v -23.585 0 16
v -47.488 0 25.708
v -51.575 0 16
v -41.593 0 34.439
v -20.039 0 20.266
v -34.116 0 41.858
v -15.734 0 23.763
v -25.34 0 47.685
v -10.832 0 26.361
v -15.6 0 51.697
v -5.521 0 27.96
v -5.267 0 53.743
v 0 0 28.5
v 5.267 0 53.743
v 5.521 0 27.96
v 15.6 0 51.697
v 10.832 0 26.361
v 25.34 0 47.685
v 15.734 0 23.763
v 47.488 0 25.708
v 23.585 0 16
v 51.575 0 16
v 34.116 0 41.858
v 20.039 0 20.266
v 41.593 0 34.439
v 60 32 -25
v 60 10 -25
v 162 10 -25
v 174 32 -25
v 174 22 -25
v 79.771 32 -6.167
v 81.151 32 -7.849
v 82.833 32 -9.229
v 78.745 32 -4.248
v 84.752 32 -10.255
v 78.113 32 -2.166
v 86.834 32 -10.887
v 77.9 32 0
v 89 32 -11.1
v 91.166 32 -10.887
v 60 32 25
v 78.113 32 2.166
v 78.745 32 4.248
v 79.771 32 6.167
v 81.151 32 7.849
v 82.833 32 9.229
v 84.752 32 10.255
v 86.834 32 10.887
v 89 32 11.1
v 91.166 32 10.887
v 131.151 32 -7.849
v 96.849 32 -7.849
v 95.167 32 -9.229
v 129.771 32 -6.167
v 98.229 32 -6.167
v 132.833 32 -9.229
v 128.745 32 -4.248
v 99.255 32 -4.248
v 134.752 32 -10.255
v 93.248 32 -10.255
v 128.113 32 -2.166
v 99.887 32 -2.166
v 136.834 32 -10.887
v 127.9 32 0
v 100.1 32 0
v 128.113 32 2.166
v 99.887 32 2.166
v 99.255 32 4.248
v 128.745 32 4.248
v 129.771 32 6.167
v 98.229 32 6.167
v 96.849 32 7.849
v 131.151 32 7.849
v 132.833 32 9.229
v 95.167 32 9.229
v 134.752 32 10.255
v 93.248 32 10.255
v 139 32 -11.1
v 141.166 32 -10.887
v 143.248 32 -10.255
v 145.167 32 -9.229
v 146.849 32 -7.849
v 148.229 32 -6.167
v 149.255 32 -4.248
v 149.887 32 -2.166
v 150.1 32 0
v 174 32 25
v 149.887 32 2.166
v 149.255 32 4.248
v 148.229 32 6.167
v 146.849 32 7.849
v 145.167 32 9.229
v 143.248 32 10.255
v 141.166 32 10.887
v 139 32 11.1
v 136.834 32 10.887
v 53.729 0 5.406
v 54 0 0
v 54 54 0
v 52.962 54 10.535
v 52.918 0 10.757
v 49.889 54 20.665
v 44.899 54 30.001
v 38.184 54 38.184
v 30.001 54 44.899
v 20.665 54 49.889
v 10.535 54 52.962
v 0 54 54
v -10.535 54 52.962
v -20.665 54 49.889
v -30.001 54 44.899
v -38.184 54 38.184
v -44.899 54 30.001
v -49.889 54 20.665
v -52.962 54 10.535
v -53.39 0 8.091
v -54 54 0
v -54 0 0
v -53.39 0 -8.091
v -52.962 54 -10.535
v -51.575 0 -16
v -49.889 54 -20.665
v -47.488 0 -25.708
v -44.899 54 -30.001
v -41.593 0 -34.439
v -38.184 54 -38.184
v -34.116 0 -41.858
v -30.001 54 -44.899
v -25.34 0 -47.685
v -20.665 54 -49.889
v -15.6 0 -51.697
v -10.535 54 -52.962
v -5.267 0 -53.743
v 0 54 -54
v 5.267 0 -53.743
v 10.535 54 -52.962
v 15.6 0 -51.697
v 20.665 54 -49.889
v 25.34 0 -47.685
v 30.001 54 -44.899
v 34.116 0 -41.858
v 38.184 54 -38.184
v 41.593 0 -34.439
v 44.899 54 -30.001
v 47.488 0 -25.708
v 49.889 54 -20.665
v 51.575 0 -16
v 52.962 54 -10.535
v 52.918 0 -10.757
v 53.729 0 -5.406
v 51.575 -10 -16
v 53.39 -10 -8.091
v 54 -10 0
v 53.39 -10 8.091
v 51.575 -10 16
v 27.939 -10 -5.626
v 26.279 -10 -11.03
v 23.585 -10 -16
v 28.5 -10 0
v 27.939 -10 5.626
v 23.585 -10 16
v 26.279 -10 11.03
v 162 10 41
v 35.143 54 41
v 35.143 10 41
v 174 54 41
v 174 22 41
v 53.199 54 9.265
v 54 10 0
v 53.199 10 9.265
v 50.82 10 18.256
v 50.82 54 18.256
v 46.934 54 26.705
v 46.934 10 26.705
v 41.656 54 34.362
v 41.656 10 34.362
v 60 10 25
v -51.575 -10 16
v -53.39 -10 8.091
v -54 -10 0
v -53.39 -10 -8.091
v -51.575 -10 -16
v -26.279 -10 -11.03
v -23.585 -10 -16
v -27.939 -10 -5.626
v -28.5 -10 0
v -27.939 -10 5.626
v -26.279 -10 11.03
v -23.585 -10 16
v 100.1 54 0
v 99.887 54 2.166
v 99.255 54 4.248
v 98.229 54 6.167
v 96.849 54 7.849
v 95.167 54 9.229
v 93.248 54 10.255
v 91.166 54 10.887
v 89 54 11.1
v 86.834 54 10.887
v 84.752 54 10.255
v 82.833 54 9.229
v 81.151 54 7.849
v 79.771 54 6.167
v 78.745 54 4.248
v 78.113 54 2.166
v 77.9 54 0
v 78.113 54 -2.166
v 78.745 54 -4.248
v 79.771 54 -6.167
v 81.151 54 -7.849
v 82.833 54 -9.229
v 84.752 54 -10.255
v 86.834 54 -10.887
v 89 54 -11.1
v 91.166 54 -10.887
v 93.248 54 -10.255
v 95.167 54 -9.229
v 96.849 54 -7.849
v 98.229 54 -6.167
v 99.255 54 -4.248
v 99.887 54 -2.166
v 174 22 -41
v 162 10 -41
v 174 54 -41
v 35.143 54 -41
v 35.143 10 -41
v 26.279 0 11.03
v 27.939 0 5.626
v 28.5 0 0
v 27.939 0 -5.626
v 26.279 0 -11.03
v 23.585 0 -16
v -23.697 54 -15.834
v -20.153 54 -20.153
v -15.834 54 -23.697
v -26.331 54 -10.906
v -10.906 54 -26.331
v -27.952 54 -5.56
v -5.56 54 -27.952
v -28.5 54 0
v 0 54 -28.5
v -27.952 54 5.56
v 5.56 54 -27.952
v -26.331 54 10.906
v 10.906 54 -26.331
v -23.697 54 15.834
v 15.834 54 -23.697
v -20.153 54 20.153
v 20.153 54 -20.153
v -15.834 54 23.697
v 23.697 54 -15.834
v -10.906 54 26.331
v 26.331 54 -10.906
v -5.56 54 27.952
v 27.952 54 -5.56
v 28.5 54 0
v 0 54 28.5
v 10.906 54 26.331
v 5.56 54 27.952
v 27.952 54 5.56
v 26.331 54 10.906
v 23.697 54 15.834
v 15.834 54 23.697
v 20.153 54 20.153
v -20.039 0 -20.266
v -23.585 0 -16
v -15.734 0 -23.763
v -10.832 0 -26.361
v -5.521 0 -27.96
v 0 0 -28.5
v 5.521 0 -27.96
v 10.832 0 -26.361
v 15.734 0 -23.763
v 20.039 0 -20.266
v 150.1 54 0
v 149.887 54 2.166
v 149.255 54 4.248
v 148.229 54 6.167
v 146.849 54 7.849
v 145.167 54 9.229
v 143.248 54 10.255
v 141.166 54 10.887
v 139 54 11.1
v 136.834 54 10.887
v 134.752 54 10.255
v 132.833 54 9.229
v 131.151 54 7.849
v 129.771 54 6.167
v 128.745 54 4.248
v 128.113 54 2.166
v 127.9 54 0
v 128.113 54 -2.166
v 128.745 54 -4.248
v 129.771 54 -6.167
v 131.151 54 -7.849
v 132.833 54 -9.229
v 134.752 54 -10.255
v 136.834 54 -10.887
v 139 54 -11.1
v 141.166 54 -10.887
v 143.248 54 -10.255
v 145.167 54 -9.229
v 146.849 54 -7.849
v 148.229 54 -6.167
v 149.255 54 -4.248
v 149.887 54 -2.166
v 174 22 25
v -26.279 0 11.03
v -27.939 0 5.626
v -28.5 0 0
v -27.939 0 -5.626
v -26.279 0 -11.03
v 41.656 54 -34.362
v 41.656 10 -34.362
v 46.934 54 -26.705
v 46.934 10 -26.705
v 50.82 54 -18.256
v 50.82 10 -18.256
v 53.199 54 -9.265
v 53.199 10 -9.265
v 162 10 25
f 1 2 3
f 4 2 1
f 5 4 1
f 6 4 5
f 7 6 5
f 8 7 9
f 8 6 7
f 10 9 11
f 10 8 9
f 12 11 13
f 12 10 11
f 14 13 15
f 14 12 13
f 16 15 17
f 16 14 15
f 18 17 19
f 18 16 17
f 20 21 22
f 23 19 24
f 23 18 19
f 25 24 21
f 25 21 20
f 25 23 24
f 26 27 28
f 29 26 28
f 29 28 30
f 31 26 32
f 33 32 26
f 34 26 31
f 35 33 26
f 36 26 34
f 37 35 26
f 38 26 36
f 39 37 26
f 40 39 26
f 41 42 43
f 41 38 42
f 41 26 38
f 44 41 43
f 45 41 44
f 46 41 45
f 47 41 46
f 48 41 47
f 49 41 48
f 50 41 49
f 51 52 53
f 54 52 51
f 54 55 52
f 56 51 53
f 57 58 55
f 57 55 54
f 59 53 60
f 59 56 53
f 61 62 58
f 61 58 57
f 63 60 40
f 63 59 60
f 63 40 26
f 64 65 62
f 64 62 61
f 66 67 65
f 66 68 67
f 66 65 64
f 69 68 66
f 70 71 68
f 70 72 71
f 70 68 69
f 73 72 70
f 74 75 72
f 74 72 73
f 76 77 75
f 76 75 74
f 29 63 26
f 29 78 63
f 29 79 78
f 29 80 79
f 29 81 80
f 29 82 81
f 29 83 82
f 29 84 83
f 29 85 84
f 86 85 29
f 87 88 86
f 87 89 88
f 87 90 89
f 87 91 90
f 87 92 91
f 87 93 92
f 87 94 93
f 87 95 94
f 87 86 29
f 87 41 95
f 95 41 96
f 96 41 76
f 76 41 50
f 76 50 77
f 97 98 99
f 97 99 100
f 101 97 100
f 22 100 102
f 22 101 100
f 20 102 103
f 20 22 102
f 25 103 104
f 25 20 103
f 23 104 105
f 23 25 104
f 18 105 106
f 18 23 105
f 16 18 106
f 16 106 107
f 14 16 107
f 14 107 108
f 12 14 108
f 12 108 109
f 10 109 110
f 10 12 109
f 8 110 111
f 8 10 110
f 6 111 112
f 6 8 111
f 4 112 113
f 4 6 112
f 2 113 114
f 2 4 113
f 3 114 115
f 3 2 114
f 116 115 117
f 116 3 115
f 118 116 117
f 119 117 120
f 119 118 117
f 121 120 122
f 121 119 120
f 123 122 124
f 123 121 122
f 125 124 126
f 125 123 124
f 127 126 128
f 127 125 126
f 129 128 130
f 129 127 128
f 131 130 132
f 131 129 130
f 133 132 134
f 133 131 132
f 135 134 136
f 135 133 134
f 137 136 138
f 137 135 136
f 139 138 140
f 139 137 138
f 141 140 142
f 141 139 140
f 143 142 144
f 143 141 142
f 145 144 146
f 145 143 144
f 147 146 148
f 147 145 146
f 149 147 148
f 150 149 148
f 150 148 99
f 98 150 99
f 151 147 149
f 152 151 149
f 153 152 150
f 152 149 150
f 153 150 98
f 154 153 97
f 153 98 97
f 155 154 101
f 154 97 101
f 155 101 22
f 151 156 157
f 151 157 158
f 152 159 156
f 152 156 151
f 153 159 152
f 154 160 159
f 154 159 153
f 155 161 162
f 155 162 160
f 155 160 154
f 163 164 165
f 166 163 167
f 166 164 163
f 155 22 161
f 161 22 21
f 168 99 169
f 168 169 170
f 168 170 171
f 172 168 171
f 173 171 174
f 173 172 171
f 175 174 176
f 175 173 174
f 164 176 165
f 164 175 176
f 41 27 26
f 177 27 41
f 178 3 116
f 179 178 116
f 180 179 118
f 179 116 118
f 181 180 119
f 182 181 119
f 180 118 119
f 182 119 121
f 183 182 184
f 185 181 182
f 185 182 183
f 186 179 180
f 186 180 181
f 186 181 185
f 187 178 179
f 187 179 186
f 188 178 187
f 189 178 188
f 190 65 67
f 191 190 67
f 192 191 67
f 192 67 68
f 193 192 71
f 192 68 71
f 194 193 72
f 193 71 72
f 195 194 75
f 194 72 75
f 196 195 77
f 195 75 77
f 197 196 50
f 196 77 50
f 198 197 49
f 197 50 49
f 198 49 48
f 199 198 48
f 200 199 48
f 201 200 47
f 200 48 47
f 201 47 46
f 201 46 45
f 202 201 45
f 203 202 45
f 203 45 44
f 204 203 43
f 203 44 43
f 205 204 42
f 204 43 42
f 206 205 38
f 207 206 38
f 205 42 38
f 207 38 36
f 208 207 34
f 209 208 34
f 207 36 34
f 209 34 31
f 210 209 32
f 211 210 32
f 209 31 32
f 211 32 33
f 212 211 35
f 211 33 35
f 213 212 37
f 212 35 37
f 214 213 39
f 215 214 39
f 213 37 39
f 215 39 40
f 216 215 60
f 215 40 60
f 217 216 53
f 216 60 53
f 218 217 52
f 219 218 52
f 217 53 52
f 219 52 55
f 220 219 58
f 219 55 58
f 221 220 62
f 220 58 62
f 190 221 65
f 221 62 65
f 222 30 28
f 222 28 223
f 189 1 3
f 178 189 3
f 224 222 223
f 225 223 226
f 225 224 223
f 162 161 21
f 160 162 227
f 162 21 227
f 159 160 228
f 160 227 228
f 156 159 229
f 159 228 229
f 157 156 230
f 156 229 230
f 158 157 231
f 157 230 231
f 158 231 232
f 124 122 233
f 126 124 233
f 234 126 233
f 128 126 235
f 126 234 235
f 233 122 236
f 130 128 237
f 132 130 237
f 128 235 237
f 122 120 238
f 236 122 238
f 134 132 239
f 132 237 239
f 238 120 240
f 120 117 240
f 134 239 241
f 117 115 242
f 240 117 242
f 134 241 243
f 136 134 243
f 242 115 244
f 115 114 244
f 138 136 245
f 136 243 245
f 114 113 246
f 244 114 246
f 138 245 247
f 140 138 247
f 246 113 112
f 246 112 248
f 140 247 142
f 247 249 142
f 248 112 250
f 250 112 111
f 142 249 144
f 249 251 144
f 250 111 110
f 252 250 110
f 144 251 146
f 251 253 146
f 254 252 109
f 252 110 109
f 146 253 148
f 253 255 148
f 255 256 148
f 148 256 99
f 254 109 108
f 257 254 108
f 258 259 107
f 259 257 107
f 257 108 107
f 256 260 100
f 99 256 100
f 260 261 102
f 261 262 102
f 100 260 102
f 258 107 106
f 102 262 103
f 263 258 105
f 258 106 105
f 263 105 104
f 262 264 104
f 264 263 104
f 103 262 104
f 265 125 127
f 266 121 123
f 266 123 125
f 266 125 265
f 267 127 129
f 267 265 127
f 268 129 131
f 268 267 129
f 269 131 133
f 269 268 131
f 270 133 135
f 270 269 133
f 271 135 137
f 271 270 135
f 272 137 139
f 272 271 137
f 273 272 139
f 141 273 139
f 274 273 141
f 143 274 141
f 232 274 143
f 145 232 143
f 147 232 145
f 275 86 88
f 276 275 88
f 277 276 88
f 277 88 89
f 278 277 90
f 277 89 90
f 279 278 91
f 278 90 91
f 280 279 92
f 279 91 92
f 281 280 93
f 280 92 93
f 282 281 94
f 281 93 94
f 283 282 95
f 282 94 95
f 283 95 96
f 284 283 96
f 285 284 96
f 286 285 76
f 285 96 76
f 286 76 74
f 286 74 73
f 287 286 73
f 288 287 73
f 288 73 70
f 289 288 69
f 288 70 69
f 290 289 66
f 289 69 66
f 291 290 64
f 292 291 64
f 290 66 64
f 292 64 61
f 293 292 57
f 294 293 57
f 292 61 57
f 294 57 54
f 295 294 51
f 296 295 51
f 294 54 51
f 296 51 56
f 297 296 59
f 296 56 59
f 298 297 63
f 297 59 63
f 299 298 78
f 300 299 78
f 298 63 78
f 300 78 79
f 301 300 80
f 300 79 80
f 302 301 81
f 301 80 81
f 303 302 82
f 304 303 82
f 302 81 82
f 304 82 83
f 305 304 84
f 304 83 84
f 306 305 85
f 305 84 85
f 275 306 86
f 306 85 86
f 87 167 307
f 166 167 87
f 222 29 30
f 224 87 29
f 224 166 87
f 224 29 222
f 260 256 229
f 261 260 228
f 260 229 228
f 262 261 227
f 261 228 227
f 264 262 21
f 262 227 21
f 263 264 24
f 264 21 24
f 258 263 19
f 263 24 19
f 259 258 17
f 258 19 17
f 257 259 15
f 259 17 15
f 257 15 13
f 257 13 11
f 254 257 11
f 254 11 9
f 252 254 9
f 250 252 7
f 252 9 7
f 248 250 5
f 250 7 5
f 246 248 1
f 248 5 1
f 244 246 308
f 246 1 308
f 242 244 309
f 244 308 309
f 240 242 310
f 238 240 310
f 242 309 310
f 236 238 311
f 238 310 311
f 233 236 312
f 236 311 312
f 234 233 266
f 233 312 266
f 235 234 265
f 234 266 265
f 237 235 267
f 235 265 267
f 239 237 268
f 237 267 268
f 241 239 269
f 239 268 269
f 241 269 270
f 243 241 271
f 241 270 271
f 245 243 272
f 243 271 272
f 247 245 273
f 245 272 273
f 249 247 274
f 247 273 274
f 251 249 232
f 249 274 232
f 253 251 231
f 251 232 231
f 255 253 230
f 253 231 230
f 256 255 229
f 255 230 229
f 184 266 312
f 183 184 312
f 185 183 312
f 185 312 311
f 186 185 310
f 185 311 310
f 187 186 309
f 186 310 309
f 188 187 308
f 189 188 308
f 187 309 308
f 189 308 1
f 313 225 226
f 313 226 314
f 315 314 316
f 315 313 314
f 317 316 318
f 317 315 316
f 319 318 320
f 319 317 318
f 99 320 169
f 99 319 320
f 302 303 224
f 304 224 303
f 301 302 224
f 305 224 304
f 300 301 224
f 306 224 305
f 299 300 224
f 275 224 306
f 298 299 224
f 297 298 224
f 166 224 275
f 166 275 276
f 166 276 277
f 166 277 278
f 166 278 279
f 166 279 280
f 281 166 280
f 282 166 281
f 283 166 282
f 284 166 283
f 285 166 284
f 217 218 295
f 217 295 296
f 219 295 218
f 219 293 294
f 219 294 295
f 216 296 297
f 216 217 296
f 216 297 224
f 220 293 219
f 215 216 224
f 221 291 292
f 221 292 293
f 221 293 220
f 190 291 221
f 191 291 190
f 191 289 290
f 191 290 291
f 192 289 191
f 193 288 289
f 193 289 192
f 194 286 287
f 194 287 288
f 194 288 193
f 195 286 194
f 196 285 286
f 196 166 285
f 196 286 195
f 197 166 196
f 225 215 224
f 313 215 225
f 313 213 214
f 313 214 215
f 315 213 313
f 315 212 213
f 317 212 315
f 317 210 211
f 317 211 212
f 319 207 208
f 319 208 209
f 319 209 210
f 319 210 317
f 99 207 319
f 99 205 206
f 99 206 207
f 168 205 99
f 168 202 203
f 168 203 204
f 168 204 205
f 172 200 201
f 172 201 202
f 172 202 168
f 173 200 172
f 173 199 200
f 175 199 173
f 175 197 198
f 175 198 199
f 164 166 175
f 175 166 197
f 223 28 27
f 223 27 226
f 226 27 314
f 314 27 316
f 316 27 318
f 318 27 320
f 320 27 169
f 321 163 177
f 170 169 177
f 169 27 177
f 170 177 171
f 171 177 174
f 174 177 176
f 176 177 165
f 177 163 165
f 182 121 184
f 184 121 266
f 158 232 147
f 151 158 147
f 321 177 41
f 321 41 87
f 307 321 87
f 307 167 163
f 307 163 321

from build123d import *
from build123d import SkipClean  # not in build123d's __all__

# Parameters (mm, degrees)
F0_R      = 54
F0_R_2    = 28.5
F1_DEPTH  = 54
F3_DEPTH  = 10
F5_DEPTH  = 44
F6_W      = 114
F6_H      = 50
F7_DEPTH  = 22
F8_SIZE   = 12
F9_R      = 11.1
F10_DEPTH = 22


with BuildPart() as f1:
    # F0 (on Front) → F1 (new body)
    with BuildSketch(Plane.XZ):
        Circle(F0_R)
        Circle(F0_R_2, mode=Mode.SUBTRACT)
    extrude(amount=-F1_DEPTH)

    # F2 (on Front) → F3 (join)
    with BuildSketch(Plane.XZ):
        with BuildLine():
            ThreePointArc((-23.5849528301, -16), (-28.5, 0), (-23.5849528301, 16))
            Line((-23.5849528301, 16), (-51.5751878329, 16))
            ThreePointArc((-51.5751878329, 16), (-54, 0), (-51.5751878329, -16))
            Line((-51.5751878329, -16), (-23.5849528301, -16))
        make_face()
        with BuildLine():
            Line((51.5751878329, 16), (23.5849528301, 16))
            ThreePointArc((23.5849528301, 16), (28.5, 0), (23.5849528301, -16))
            Line((23.5849528301, -16), (51.5751878329, -16))
            ThreePointArc((51.5751878329, -16), (54, 0), (51.5751878329, 16))
        make_face()
    with SkipClean():  # cleaning this boolean's faces spoils the solid; the shape is the same uncleaned
        extrude(amount=F3_DEPTH)


with BuildPart() as f5:
    # F4 (on face) → F5 (new body)
    with BuildSketch(Plane(origin=(0, 54, 0), x_dir=(-1, 0, 0), z_dir=(0, 1, 0))):
        with BuildLine():
            Line((-174, 41), (-174, 0))
            Line((-174, 0), (-174, -41))
            Line((-174, -41), (-35.1425667816, -41))
            ThreePointArc((-35.1425667816, -41), (-49.0596504584, -22.5643678594), (-54, 0))
            ThreePointArc((-54, 0), (-49.0596504584, 22.5643678594), (-35.1425667816, 41))
            Line((-35.1425667816, 41), (-174, 41))
        make_face()
    extrude(amount=-F5_DEPTH)

    # F6 (on face) → F7 (cut)
    with BuildSketch(Plane.XZ.offset(-10)):
        with Locations((117, 0)):
            Rectangle(F6_W, F6_H)
    extrude(amount=-F7_DEPTH, mode=Mode.SUBTRACT)

    # F8
    f8_edges = [f5.edges().sort_by_distance(p)[0] for p in [
        (174, 10, 33),
        (174, 10, -33),
    ]]
    chamfer(f8_edges, length=F8_SIZE)

    # F9 (on face) → F10 (cut, through all)
    with BuildSketch(Plane.XZ.offset(-32)):
        with Locations((139, 0)):
            Circle(F9_R)
        with Locations((89, 0)):
            Circle(F9_R)
    extrude(amount=-F10_DEPTH, mode=Mode.SUBTRACT)


solid = Compound([f1.part, f5.part])
